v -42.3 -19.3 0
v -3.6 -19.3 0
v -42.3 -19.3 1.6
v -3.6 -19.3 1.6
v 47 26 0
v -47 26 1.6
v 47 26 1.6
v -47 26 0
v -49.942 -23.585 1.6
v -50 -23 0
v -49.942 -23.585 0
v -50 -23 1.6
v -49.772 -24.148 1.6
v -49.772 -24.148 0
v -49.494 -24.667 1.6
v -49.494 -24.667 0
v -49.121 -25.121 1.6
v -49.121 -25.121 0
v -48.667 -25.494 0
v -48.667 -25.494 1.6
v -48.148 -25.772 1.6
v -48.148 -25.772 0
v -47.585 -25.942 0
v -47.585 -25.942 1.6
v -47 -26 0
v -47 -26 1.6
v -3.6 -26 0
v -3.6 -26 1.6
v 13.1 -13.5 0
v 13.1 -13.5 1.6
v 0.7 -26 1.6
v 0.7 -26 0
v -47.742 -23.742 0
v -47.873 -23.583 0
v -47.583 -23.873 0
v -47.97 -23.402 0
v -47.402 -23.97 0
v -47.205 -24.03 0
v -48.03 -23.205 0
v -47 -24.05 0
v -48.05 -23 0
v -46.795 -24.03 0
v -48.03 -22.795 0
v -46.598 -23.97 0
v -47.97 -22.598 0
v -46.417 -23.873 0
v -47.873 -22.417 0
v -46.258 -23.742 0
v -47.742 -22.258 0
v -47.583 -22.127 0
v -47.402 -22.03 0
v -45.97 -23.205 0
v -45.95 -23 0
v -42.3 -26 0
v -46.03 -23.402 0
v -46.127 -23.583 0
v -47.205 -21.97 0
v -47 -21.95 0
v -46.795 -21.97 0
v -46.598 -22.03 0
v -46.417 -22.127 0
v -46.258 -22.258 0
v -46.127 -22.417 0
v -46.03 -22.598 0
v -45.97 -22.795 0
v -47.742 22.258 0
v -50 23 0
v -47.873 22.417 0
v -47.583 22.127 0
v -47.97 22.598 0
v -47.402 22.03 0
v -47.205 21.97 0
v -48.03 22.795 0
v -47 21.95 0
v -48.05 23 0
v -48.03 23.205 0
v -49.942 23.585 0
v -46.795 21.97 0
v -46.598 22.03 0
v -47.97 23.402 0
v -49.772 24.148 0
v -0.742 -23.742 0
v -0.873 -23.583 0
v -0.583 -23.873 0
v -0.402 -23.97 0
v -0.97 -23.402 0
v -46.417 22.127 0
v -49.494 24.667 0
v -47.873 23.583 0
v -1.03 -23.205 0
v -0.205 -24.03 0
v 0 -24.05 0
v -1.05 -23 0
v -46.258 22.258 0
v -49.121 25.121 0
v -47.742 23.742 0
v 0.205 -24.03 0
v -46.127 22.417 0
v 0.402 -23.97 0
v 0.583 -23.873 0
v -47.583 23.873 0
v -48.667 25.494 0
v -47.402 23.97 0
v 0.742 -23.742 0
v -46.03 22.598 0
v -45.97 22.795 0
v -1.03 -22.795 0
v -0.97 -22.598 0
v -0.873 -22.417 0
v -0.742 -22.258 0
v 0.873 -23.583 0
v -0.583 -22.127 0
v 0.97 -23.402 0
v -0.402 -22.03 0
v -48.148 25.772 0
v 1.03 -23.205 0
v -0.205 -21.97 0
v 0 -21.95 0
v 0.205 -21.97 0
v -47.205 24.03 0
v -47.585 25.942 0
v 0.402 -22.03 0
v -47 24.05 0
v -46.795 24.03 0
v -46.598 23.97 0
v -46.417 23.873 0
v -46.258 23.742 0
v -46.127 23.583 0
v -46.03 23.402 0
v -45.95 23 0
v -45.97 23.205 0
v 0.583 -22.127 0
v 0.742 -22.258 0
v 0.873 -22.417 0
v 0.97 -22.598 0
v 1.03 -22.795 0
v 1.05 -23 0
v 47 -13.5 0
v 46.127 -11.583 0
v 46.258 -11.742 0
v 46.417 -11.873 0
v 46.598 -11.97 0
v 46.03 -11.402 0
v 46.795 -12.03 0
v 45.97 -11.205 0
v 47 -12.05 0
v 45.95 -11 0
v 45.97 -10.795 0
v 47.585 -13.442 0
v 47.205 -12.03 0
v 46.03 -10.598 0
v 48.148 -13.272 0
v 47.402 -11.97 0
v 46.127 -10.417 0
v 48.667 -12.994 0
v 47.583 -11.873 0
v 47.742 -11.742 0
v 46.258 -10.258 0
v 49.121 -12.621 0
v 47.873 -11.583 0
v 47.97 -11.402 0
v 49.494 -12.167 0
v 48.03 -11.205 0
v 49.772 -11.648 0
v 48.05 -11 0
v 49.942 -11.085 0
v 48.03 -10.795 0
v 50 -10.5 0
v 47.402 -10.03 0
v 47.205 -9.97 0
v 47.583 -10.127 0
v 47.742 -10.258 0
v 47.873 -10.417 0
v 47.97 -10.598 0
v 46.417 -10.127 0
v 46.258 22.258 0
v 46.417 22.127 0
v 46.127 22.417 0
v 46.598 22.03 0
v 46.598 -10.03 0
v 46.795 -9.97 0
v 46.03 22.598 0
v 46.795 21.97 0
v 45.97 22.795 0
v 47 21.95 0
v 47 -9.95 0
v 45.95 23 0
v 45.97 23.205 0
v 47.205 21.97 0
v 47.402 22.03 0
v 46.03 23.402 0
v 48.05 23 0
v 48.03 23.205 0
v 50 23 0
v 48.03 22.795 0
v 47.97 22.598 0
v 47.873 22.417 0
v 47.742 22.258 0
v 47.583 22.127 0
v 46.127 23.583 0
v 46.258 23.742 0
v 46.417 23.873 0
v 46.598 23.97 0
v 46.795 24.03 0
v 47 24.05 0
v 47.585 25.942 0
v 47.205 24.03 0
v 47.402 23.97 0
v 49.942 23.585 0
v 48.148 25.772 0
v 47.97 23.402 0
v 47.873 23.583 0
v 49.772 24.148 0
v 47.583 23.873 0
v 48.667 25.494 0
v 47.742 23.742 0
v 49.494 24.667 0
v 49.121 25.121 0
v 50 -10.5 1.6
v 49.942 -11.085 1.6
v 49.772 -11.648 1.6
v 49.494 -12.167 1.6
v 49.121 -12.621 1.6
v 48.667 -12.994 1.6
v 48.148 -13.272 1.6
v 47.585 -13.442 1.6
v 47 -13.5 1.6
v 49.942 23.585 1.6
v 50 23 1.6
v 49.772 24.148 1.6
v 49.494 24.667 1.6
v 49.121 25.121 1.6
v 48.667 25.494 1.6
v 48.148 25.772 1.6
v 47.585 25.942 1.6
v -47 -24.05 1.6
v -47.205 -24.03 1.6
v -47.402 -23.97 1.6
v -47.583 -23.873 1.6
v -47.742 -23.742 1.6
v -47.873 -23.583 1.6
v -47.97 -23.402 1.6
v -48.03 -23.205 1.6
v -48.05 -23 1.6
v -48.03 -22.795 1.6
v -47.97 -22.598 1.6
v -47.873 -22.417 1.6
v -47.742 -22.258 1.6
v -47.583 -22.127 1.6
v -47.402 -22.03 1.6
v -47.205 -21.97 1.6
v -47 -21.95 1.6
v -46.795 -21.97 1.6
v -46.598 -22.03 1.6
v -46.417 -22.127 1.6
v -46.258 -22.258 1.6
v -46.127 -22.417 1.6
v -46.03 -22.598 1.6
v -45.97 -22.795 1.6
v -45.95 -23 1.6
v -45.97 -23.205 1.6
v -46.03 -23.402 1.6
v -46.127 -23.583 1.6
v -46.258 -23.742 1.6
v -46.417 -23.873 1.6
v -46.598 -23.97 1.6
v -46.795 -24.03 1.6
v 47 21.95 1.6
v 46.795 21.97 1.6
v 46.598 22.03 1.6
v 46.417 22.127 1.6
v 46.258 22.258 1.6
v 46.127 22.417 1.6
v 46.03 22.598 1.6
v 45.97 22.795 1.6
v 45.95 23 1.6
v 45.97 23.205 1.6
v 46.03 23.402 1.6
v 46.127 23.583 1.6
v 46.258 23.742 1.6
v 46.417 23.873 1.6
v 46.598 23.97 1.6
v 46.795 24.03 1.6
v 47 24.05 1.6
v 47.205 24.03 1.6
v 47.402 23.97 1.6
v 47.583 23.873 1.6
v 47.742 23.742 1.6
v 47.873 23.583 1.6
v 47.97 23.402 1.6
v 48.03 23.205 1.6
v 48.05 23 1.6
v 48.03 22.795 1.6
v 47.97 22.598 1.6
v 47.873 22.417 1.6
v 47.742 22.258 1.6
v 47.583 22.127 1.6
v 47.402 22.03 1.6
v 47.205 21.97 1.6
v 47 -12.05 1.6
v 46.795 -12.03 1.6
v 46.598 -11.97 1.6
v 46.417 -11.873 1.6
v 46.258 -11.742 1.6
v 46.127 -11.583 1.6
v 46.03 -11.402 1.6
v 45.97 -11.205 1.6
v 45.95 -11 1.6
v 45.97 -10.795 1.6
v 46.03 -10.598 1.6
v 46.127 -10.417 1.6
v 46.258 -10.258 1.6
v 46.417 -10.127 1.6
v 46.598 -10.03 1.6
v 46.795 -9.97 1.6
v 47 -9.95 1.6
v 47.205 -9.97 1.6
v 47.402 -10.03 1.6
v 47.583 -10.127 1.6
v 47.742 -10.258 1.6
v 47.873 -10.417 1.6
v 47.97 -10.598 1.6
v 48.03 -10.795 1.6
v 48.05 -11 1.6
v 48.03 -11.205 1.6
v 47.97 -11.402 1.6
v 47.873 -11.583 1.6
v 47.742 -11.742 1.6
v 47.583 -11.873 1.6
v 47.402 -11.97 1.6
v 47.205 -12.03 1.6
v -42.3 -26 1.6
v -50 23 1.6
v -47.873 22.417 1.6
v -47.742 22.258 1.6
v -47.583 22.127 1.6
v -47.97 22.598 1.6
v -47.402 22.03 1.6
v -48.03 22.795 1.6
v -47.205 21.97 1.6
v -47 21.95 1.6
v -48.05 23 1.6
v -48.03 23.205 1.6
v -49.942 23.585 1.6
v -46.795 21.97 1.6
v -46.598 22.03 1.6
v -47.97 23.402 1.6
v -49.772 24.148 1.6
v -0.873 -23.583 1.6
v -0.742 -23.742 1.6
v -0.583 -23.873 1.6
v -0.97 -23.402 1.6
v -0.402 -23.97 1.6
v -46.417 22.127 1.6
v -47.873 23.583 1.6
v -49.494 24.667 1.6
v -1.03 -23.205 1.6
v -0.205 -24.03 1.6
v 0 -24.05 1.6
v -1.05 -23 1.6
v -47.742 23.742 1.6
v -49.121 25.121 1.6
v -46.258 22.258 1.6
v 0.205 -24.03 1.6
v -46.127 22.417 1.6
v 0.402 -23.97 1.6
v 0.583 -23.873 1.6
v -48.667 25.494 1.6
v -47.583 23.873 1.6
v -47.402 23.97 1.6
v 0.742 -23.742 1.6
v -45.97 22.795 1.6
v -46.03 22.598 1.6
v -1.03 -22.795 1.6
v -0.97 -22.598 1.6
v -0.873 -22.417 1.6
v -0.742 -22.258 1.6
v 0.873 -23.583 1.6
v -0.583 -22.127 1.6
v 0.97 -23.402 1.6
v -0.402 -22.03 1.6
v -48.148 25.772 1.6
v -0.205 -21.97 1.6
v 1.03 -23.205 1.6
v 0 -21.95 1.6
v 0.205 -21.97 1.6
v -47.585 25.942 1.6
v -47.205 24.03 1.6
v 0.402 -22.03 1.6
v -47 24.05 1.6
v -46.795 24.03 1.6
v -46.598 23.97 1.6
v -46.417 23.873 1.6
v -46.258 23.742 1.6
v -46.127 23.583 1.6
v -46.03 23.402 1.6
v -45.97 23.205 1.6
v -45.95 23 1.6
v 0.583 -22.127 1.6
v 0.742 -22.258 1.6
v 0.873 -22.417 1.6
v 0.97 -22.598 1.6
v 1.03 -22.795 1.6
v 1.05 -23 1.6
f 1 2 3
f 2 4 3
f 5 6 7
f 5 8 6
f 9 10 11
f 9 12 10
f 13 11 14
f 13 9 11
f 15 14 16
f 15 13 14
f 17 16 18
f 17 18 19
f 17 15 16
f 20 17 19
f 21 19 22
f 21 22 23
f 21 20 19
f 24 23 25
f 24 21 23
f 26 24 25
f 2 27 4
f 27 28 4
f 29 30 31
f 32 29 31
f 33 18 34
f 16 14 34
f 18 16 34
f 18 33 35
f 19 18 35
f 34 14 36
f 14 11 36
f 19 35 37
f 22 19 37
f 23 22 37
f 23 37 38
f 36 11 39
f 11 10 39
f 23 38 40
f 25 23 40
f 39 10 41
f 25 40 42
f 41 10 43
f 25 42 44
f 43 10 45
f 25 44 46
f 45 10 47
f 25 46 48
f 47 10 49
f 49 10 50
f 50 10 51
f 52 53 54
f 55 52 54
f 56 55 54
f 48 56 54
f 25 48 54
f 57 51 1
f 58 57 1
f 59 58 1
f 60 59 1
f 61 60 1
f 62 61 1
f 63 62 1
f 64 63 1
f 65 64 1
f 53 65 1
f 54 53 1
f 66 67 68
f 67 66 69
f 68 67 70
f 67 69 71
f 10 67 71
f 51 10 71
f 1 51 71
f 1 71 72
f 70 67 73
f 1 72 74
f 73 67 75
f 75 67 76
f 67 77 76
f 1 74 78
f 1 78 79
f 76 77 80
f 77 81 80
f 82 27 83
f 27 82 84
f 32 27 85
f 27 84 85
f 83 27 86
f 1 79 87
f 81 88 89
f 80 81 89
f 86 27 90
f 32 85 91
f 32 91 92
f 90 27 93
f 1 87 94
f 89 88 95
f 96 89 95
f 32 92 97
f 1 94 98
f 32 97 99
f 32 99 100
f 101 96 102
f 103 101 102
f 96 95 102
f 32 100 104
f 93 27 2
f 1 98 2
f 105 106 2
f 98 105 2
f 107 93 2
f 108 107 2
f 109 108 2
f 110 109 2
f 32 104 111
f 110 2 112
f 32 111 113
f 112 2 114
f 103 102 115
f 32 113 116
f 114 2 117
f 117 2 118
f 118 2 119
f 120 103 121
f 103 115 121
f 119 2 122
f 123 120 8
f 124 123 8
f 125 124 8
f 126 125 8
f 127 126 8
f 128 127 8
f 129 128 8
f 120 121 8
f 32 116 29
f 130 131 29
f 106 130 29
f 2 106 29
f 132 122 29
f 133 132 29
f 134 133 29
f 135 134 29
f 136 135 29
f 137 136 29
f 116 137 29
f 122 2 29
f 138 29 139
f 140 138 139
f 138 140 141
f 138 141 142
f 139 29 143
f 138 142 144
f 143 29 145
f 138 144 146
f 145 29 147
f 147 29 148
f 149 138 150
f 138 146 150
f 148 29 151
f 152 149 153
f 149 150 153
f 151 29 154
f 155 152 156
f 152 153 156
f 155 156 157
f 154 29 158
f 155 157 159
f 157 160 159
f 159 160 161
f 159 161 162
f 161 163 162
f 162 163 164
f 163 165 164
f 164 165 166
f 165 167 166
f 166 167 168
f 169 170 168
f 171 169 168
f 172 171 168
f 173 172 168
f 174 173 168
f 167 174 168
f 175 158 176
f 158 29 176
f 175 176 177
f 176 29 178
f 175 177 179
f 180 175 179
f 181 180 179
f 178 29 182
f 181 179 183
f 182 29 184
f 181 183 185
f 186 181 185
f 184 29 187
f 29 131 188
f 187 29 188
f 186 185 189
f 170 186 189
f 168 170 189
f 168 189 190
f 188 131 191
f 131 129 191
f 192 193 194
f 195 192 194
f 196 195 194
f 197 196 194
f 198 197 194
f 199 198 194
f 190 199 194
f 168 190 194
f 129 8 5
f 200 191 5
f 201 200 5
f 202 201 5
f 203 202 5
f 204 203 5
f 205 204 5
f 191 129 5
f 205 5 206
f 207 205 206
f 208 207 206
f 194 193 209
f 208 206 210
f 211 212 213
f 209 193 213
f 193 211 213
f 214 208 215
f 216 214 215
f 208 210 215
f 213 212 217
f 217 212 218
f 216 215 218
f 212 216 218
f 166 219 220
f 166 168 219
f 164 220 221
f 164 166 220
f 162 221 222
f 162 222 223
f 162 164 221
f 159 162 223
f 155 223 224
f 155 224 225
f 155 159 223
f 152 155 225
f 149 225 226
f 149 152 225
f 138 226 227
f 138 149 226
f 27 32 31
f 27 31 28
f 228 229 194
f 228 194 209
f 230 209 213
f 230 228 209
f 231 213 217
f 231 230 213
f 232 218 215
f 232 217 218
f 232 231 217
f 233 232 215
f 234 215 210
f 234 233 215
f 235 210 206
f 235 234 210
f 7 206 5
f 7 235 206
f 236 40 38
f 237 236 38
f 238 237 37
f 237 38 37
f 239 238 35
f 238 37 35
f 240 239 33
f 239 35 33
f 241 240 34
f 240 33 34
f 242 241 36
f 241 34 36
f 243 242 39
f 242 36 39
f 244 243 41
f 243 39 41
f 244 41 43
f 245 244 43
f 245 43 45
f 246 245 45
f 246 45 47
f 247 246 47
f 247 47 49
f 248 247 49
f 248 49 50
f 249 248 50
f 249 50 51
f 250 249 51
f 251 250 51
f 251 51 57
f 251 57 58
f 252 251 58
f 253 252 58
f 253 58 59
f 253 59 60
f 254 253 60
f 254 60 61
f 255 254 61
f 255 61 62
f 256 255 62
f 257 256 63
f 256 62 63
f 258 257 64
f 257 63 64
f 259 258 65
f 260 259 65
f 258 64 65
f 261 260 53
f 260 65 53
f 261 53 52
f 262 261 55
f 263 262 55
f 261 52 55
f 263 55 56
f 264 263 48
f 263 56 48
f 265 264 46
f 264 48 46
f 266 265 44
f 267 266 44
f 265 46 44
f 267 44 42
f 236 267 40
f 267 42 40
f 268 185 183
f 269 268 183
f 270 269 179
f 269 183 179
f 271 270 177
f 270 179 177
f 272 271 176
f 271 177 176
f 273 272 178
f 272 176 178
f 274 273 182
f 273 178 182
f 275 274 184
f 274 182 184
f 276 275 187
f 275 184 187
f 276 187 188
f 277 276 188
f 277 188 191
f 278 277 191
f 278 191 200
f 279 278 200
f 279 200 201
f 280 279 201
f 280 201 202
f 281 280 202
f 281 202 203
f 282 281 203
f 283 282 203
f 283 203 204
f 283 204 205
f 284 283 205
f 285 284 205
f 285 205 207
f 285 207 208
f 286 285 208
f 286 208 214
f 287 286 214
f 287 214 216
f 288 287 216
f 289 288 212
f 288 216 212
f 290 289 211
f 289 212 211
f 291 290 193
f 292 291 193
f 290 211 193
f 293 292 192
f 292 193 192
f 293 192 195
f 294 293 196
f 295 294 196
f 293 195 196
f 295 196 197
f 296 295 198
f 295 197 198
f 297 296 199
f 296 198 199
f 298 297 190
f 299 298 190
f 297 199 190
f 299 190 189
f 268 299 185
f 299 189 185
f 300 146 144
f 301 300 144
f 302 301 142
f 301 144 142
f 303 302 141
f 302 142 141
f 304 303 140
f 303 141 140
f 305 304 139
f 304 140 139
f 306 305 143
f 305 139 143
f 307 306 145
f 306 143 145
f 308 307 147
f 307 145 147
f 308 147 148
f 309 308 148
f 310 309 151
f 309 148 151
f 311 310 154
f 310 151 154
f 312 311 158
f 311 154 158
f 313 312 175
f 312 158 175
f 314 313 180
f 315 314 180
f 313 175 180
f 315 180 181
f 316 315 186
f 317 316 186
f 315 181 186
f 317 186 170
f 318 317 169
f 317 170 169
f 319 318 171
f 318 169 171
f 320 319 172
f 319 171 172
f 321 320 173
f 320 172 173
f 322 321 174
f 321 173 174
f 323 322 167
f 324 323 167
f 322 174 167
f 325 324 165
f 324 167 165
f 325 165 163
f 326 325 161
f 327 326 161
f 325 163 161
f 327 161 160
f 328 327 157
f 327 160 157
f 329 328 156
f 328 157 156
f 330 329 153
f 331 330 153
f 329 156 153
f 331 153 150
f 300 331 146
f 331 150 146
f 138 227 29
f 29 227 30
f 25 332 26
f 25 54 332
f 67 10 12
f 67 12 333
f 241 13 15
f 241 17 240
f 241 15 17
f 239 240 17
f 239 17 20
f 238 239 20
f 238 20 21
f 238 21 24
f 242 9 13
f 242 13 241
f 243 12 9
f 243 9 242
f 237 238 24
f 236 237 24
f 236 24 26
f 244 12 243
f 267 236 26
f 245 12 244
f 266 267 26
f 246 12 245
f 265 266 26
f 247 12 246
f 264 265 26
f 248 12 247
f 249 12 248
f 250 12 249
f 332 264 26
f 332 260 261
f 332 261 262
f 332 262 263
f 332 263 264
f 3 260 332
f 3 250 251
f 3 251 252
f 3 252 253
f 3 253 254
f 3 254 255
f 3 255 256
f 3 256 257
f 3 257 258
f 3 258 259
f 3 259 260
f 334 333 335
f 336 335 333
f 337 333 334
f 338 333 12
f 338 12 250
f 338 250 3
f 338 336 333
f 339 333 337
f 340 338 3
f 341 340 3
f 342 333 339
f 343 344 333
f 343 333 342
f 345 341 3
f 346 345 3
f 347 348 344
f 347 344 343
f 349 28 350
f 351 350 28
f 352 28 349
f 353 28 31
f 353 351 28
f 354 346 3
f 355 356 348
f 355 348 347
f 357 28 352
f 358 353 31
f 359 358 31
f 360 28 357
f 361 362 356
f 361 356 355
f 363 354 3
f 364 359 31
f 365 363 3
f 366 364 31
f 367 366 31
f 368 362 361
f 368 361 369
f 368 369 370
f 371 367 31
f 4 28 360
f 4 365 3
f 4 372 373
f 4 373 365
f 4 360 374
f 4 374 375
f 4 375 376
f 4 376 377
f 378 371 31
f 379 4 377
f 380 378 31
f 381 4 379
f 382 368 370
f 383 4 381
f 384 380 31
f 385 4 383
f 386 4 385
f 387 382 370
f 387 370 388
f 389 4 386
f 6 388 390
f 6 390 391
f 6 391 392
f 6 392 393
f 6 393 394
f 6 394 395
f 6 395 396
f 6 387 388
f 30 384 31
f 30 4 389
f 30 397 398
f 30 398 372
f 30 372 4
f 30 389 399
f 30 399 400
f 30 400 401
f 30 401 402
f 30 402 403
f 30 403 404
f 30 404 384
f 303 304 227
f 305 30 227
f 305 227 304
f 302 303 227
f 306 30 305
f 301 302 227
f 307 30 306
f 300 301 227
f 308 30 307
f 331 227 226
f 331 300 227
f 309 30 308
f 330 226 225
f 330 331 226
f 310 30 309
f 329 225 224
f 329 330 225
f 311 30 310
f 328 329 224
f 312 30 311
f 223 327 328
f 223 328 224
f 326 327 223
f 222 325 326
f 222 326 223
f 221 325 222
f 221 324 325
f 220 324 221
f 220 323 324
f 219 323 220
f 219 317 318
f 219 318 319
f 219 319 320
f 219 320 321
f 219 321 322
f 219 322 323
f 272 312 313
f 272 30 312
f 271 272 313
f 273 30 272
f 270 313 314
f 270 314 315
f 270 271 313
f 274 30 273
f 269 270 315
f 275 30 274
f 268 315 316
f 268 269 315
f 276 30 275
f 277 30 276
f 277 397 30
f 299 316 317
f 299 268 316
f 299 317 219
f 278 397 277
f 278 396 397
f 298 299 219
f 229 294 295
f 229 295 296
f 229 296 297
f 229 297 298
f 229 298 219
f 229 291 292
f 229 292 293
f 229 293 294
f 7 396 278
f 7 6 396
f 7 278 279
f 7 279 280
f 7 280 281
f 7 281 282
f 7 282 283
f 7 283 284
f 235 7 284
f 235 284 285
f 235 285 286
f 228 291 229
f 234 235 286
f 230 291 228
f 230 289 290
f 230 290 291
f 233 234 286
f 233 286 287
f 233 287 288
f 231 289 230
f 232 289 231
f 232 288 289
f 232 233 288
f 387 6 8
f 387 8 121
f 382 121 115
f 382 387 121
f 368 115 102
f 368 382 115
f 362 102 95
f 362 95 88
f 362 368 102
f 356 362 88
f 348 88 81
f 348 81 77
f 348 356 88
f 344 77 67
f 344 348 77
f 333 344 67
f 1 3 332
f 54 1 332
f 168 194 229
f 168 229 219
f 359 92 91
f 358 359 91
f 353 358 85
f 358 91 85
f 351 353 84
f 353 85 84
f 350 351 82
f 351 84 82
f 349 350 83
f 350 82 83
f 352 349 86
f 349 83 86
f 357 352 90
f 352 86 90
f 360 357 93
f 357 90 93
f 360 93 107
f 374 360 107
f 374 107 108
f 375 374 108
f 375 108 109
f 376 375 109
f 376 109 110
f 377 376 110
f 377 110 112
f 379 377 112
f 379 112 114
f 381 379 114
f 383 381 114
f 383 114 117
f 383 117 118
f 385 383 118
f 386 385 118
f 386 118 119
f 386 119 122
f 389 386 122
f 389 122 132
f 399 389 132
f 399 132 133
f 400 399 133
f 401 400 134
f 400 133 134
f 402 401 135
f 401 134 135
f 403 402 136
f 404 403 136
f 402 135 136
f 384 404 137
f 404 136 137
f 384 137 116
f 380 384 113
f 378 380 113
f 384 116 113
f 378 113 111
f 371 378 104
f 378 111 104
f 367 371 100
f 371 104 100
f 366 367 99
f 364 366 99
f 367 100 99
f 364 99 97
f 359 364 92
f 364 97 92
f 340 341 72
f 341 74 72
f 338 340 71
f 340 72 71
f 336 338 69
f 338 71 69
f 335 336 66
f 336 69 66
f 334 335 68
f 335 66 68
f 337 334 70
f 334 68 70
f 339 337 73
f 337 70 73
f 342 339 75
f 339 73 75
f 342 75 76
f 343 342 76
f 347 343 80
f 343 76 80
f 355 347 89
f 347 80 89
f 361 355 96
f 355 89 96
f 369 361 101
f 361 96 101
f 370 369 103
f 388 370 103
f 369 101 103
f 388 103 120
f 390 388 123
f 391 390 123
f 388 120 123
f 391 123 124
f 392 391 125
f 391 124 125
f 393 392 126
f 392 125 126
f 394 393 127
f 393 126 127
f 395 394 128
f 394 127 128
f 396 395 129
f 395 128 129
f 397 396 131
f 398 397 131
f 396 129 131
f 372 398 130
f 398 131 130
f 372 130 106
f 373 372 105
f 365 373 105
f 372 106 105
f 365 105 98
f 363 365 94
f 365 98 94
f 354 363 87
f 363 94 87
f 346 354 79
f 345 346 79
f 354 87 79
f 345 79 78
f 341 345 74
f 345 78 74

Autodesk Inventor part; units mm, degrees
ref_plane "YZ Plane" through (0, 0, 0) normal (1, 0, 0) x (0, 1, 0)
ref_plane "XZ Plane" through (0, 0, 0) normal (0, 1, 0) x (-1, 0, 0)
ref_plane "XY Plane" through (0, 0, 0) normal (0, 0, 1) x (1, 0, 0)
sketch "Sketch1" plane through (0, 0, 0) normal (0, 0, 1) x (1, 0, 0)
  line L0 (-50, 26) -> (50, 26)
  line L1 (50, 26) -> (50, -26)
  line L2 (50, -26) -> (-50, -26)
  line L3 (-50, -26) -> (-50, 26)
  point P0 (0, 0)
  dimension "d0" = 100
  dimension "d1" = 52
  dimension "d2" = 50
  dimension "d3" = 26
extrude "Extrusion1" add sketch "Sketch1" along normal blind 1.6
sketch "Sketch2" plane through (0, 0, 1.6) normal (0, 0, 1) x (1, 0, 0)
  line L0 (-50, 26) -> (-50, -26) projected
  line L1 (-50, -26) -> (50, -26) projected
  point P0 (0, 0)
  point P1 (-47, -23)
  point P2 (0, -23)
  point P3 (-47, 23)
  point P4 (47, 23)
  point P5 (47, -11)
  dimension "d6" = 3
  dimension "d7" = 3
  dimension "d8" = 50
  dimension "d9" = 3
  dimension "d10" = 97
  dimension "d11" = 15
  dimension "d12" = 3
  dimension "d13" = 49
  dimension "d14" = 97
  dimension "d15" = 49
hole "Hole1" at (-47, -23, 1.6) at (0, -23, 1.6) at (-47, 23, 1.6) at (47, 23, 1.6) at (47, -11, 1.6) direction (0, 0, -1) diameter 2.1 depth 10 tip angle 118
sketch "Sketch3" plane through (0, 0, 1.6) normal (0, 0, 1) x (1, 0, 0)
  line L0 (-50, -26) -> (50, -26) projected
  line L1 (-42.3, -26) -> (-3.6, -26)
  line L2 (-3.6, -26) -> (-3.6, -19.3)
  line L3 (-3.6, -19.3) -> (-42.3, -19.3)
  line L4 (-42.3, -19.3) -> (-42.3, -26)
  line L5 (50, -26) -> (50, 26) projected
  line L6 (13.1, -26) -> (50, -26)
  line L7 (50, -26) -> (50, -13.5)
  line L8 (50, -13.5) -> (13.1, -13.5)
  line L9 (13.1, -13.5) -> (13.1, -26)
  line L10 (13.1, -13.5) -> (0.7, -26)
  line L11 (0.7, -26) -> (13.1, -26)
  line L12 (-50, 26) -> (-50, -26) projected
  point P0 (0, 0)
  dimension "d23" = 7.7
  dimension "d24" = 6.7
  dimension "d25" = 46.4
  dimension "d26" = 50.7
  dimension "d27" = 63.1
  dimension "d28" = 12.5
extrude "Extrusion2" cut sketch "Sketch3" against normal blind 1.6
fillet "Fillet1" radius 3 4 edges at (-50, -26, 0.8) (-50, 26, 0.8) (50, -13.5, 0.8) (50, 26, 0.8)
properties part number "pcb_mockup"
